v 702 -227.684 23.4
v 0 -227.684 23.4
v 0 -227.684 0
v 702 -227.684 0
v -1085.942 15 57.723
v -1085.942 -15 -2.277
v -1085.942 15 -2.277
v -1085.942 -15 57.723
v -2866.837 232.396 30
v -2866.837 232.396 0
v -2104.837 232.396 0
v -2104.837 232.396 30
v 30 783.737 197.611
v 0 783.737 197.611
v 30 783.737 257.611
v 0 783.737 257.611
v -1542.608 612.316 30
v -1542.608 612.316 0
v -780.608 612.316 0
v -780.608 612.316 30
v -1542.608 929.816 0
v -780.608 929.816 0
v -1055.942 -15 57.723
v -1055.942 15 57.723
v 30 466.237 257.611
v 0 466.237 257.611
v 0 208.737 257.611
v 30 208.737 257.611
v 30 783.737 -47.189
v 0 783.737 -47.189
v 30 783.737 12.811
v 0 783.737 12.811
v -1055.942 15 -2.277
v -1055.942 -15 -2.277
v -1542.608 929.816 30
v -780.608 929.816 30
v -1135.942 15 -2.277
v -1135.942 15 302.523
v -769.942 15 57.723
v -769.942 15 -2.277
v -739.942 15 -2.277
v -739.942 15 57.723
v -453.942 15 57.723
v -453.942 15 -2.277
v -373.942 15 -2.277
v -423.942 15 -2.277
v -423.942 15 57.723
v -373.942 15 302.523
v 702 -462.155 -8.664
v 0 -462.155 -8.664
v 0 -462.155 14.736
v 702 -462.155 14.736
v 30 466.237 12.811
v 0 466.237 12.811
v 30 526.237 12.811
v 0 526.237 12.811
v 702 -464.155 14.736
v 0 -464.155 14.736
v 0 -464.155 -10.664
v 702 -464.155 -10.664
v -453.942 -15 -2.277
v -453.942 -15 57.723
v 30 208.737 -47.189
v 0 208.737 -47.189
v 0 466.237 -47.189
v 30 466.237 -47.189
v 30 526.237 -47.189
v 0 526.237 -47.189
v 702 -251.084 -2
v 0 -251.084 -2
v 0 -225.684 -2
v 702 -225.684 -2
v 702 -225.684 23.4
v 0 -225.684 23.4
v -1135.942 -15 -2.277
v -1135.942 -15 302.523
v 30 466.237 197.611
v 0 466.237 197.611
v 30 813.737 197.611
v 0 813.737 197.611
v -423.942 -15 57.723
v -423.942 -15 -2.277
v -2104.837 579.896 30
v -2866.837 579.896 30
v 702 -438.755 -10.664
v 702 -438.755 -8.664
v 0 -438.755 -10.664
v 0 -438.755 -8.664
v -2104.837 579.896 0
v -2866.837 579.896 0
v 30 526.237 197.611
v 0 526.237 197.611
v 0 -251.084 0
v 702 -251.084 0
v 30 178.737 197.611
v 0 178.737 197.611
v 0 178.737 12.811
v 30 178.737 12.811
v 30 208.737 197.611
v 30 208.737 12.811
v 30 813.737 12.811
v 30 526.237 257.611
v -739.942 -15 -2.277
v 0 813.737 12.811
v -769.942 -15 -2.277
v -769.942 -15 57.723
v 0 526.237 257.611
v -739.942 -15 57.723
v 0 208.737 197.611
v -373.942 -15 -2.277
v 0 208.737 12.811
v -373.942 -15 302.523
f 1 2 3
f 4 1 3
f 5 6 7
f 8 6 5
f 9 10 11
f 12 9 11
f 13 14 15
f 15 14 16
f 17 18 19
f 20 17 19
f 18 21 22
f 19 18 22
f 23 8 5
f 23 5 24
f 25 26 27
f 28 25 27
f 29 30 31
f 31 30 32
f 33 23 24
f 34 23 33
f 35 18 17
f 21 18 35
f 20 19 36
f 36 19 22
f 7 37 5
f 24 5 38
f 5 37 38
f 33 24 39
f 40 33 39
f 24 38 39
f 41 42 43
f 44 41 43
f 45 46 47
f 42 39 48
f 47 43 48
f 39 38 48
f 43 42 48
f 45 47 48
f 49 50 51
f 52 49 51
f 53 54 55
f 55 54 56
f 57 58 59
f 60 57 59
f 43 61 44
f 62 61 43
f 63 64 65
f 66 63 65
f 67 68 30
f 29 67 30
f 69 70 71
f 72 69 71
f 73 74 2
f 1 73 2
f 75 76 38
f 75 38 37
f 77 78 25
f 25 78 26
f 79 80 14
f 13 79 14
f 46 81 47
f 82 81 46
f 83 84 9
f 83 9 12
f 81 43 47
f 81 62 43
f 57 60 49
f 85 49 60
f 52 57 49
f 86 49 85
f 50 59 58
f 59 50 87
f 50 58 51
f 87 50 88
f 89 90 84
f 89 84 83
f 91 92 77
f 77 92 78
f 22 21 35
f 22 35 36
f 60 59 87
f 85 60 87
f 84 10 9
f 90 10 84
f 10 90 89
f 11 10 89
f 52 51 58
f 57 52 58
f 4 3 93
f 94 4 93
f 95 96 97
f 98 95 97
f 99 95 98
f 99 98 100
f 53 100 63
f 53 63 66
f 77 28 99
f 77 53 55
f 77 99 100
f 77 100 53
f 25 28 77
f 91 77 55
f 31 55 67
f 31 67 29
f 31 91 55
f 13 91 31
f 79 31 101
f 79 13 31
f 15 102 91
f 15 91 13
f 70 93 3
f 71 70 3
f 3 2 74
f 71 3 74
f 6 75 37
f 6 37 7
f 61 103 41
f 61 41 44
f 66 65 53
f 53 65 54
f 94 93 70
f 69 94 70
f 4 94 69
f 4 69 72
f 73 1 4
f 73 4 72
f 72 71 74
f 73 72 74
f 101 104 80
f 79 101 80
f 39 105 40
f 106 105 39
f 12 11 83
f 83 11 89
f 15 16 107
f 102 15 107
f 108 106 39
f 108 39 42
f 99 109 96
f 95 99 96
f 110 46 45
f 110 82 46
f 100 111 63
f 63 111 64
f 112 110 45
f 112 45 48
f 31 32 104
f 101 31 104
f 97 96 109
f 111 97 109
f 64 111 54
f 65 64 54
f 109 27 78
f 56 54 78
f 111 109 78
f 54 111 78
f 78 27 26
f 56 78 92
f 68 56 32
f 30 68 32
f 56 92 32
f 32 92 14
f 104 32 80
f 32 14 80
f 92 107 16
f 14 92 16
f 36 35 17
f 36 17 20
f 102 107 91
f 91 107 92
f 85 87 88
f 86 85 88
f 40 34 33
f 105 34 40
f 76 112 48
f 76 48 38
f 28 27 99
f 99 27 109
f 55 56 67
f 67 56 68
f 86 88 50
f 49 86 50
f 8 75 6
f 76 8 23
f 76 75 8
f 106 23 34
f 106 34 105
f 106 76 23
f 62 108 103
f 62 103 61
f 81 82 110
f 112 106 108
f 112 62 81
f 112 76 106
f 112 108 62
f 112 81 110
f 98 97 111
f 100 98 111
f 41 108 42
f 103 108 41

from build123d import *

# Parameters (mm, degrees)
F1_DEPTH  = 30
F3_DEPTH  = 15
F4_W      = 762
F4_H      = 317.5
F5_DEPTH  = 30
F6_W      = 762
F6_H      = 347.5
F7_DEPTH  = 30
F9_DEPTH  = 702
F11_DEPTH = 702


with BuildPart() as f1:
    # F0 (on Right) → F1 (new body)
    with BuildSketch(Plane.YZ):
        Polygon((466.2374494703, 257.6106337394), (208.7374494703, 257.6106337394), (208.7374494703, 197.6106337394), (178.7374494703, 197.6106337394), (178.7374494703, 12.8106337394), (208.7374494703, 12.8106337394), (208.7374494703, -47.1893662606), (466.2374494703, -47.1893662606), (466.2374494703, 12.8106337394), (496.2374494703, 12.8106337394), (526.2374494703, 12.8106337394), (526.2374494703, -47.1893662606), (783.7374494703, -47.1893662606), (783.7374494703, 12.8106337394), (813.7374494703, 12.8106337394), (813.7374494703, 197.6106337394), (783.7374494703, 197.6106337394), (783.7374494703, 257.6106337394), (526.2374494703, 257.6106337394), (526.2374494703, 197.6106337394), (496.2374494703, 197.6106337394), (466.2374494703, 197.6106337394), align=None)
    extrude(amount=F1_DEPTH)


with BuildPart() as f3:
    # F2 (on Front) → F3 (new body, symmetric)
    with BuildSketch(Plane.XZ):
        Polygon((-423.9423278741, -2.2772382736), (-373.9423278741, -2.2772382736), (-373.9423278741, 302.5227617264), (-739.9423278741, 302.5227617264), (-769.9423278741, 302.5227617264), (-1135.9423278741, 302.5227617264), (-1135.9423278741, -2.2772382736), (-1085.9423278741, -2.2772382736), (-1085.9423278741, 57.7227617264), (-1055.9423278741, 57.7227617264), (-1055.9423278741, -2.2772382736), (-769.9423278741, -2.2772382736), (-769.9423278741, 57.7227617264), (-739.9423278741, 57.7227617264), (-739.9423278741, -2.2772382736), (-453.9423278741, -2.2772382736), (-453.9423278741, 57.7227617264), (-423.9423278741, 57.7227617264), align=None)
    extrude(amount=F3_DEPTH, both=True)


with BuildPart() as f5:
    # F4 (on Top) → F5 (new body)
    with BuildSketch(Plane.XY):
        with Locations((-1161.608338356, 771.0658864038)):
            Rectangle(F4_W, F4_H)
    extrude(amount=F5_DEPTH)


with BuildPart() as f7:
    # F6 (on Top) → F7 (new body)
    with BuildSketch(Plane.XY):
        with Locations((-2485.8374595642, 406.1455408742)):
            Rectangle(F6_W, F6_H)
    extrude(amount=F7_DEPTH)


with BuildPart() as f9:
    # F8 (on Right) → F9 (new body)
    with BuildSketch(Plane.YZ):
        Polygon((-462.1549821615, 14.736385662), (-464.1549821615, 14.736385662), (-464.1549821615, -10.663614338), (-438.7549821615, -10.663614338), (-438.7549821615, -8.663614338), (-462.1549821615, -8.663614338), align=None)
    extrude(amount=F9_DEPTH)


with BuildPart() as f11:
    # F10 (on Right) → F11 (new body)
    with BuildSketch(Plane.YZ):
        Polygon((-225.6837735602, -2), (-225.6837735602, 23.4), (-227.6837735602, 23.4), (-227.6837735602, 0), (-251.0837735602, 0), (-251.0837735602, -2), align=None)
    extrude(amount=F11_DEPTH)


solid = Compound([f1.part, f3.part, f5.part, f7.part, f9.part, f11.part])
